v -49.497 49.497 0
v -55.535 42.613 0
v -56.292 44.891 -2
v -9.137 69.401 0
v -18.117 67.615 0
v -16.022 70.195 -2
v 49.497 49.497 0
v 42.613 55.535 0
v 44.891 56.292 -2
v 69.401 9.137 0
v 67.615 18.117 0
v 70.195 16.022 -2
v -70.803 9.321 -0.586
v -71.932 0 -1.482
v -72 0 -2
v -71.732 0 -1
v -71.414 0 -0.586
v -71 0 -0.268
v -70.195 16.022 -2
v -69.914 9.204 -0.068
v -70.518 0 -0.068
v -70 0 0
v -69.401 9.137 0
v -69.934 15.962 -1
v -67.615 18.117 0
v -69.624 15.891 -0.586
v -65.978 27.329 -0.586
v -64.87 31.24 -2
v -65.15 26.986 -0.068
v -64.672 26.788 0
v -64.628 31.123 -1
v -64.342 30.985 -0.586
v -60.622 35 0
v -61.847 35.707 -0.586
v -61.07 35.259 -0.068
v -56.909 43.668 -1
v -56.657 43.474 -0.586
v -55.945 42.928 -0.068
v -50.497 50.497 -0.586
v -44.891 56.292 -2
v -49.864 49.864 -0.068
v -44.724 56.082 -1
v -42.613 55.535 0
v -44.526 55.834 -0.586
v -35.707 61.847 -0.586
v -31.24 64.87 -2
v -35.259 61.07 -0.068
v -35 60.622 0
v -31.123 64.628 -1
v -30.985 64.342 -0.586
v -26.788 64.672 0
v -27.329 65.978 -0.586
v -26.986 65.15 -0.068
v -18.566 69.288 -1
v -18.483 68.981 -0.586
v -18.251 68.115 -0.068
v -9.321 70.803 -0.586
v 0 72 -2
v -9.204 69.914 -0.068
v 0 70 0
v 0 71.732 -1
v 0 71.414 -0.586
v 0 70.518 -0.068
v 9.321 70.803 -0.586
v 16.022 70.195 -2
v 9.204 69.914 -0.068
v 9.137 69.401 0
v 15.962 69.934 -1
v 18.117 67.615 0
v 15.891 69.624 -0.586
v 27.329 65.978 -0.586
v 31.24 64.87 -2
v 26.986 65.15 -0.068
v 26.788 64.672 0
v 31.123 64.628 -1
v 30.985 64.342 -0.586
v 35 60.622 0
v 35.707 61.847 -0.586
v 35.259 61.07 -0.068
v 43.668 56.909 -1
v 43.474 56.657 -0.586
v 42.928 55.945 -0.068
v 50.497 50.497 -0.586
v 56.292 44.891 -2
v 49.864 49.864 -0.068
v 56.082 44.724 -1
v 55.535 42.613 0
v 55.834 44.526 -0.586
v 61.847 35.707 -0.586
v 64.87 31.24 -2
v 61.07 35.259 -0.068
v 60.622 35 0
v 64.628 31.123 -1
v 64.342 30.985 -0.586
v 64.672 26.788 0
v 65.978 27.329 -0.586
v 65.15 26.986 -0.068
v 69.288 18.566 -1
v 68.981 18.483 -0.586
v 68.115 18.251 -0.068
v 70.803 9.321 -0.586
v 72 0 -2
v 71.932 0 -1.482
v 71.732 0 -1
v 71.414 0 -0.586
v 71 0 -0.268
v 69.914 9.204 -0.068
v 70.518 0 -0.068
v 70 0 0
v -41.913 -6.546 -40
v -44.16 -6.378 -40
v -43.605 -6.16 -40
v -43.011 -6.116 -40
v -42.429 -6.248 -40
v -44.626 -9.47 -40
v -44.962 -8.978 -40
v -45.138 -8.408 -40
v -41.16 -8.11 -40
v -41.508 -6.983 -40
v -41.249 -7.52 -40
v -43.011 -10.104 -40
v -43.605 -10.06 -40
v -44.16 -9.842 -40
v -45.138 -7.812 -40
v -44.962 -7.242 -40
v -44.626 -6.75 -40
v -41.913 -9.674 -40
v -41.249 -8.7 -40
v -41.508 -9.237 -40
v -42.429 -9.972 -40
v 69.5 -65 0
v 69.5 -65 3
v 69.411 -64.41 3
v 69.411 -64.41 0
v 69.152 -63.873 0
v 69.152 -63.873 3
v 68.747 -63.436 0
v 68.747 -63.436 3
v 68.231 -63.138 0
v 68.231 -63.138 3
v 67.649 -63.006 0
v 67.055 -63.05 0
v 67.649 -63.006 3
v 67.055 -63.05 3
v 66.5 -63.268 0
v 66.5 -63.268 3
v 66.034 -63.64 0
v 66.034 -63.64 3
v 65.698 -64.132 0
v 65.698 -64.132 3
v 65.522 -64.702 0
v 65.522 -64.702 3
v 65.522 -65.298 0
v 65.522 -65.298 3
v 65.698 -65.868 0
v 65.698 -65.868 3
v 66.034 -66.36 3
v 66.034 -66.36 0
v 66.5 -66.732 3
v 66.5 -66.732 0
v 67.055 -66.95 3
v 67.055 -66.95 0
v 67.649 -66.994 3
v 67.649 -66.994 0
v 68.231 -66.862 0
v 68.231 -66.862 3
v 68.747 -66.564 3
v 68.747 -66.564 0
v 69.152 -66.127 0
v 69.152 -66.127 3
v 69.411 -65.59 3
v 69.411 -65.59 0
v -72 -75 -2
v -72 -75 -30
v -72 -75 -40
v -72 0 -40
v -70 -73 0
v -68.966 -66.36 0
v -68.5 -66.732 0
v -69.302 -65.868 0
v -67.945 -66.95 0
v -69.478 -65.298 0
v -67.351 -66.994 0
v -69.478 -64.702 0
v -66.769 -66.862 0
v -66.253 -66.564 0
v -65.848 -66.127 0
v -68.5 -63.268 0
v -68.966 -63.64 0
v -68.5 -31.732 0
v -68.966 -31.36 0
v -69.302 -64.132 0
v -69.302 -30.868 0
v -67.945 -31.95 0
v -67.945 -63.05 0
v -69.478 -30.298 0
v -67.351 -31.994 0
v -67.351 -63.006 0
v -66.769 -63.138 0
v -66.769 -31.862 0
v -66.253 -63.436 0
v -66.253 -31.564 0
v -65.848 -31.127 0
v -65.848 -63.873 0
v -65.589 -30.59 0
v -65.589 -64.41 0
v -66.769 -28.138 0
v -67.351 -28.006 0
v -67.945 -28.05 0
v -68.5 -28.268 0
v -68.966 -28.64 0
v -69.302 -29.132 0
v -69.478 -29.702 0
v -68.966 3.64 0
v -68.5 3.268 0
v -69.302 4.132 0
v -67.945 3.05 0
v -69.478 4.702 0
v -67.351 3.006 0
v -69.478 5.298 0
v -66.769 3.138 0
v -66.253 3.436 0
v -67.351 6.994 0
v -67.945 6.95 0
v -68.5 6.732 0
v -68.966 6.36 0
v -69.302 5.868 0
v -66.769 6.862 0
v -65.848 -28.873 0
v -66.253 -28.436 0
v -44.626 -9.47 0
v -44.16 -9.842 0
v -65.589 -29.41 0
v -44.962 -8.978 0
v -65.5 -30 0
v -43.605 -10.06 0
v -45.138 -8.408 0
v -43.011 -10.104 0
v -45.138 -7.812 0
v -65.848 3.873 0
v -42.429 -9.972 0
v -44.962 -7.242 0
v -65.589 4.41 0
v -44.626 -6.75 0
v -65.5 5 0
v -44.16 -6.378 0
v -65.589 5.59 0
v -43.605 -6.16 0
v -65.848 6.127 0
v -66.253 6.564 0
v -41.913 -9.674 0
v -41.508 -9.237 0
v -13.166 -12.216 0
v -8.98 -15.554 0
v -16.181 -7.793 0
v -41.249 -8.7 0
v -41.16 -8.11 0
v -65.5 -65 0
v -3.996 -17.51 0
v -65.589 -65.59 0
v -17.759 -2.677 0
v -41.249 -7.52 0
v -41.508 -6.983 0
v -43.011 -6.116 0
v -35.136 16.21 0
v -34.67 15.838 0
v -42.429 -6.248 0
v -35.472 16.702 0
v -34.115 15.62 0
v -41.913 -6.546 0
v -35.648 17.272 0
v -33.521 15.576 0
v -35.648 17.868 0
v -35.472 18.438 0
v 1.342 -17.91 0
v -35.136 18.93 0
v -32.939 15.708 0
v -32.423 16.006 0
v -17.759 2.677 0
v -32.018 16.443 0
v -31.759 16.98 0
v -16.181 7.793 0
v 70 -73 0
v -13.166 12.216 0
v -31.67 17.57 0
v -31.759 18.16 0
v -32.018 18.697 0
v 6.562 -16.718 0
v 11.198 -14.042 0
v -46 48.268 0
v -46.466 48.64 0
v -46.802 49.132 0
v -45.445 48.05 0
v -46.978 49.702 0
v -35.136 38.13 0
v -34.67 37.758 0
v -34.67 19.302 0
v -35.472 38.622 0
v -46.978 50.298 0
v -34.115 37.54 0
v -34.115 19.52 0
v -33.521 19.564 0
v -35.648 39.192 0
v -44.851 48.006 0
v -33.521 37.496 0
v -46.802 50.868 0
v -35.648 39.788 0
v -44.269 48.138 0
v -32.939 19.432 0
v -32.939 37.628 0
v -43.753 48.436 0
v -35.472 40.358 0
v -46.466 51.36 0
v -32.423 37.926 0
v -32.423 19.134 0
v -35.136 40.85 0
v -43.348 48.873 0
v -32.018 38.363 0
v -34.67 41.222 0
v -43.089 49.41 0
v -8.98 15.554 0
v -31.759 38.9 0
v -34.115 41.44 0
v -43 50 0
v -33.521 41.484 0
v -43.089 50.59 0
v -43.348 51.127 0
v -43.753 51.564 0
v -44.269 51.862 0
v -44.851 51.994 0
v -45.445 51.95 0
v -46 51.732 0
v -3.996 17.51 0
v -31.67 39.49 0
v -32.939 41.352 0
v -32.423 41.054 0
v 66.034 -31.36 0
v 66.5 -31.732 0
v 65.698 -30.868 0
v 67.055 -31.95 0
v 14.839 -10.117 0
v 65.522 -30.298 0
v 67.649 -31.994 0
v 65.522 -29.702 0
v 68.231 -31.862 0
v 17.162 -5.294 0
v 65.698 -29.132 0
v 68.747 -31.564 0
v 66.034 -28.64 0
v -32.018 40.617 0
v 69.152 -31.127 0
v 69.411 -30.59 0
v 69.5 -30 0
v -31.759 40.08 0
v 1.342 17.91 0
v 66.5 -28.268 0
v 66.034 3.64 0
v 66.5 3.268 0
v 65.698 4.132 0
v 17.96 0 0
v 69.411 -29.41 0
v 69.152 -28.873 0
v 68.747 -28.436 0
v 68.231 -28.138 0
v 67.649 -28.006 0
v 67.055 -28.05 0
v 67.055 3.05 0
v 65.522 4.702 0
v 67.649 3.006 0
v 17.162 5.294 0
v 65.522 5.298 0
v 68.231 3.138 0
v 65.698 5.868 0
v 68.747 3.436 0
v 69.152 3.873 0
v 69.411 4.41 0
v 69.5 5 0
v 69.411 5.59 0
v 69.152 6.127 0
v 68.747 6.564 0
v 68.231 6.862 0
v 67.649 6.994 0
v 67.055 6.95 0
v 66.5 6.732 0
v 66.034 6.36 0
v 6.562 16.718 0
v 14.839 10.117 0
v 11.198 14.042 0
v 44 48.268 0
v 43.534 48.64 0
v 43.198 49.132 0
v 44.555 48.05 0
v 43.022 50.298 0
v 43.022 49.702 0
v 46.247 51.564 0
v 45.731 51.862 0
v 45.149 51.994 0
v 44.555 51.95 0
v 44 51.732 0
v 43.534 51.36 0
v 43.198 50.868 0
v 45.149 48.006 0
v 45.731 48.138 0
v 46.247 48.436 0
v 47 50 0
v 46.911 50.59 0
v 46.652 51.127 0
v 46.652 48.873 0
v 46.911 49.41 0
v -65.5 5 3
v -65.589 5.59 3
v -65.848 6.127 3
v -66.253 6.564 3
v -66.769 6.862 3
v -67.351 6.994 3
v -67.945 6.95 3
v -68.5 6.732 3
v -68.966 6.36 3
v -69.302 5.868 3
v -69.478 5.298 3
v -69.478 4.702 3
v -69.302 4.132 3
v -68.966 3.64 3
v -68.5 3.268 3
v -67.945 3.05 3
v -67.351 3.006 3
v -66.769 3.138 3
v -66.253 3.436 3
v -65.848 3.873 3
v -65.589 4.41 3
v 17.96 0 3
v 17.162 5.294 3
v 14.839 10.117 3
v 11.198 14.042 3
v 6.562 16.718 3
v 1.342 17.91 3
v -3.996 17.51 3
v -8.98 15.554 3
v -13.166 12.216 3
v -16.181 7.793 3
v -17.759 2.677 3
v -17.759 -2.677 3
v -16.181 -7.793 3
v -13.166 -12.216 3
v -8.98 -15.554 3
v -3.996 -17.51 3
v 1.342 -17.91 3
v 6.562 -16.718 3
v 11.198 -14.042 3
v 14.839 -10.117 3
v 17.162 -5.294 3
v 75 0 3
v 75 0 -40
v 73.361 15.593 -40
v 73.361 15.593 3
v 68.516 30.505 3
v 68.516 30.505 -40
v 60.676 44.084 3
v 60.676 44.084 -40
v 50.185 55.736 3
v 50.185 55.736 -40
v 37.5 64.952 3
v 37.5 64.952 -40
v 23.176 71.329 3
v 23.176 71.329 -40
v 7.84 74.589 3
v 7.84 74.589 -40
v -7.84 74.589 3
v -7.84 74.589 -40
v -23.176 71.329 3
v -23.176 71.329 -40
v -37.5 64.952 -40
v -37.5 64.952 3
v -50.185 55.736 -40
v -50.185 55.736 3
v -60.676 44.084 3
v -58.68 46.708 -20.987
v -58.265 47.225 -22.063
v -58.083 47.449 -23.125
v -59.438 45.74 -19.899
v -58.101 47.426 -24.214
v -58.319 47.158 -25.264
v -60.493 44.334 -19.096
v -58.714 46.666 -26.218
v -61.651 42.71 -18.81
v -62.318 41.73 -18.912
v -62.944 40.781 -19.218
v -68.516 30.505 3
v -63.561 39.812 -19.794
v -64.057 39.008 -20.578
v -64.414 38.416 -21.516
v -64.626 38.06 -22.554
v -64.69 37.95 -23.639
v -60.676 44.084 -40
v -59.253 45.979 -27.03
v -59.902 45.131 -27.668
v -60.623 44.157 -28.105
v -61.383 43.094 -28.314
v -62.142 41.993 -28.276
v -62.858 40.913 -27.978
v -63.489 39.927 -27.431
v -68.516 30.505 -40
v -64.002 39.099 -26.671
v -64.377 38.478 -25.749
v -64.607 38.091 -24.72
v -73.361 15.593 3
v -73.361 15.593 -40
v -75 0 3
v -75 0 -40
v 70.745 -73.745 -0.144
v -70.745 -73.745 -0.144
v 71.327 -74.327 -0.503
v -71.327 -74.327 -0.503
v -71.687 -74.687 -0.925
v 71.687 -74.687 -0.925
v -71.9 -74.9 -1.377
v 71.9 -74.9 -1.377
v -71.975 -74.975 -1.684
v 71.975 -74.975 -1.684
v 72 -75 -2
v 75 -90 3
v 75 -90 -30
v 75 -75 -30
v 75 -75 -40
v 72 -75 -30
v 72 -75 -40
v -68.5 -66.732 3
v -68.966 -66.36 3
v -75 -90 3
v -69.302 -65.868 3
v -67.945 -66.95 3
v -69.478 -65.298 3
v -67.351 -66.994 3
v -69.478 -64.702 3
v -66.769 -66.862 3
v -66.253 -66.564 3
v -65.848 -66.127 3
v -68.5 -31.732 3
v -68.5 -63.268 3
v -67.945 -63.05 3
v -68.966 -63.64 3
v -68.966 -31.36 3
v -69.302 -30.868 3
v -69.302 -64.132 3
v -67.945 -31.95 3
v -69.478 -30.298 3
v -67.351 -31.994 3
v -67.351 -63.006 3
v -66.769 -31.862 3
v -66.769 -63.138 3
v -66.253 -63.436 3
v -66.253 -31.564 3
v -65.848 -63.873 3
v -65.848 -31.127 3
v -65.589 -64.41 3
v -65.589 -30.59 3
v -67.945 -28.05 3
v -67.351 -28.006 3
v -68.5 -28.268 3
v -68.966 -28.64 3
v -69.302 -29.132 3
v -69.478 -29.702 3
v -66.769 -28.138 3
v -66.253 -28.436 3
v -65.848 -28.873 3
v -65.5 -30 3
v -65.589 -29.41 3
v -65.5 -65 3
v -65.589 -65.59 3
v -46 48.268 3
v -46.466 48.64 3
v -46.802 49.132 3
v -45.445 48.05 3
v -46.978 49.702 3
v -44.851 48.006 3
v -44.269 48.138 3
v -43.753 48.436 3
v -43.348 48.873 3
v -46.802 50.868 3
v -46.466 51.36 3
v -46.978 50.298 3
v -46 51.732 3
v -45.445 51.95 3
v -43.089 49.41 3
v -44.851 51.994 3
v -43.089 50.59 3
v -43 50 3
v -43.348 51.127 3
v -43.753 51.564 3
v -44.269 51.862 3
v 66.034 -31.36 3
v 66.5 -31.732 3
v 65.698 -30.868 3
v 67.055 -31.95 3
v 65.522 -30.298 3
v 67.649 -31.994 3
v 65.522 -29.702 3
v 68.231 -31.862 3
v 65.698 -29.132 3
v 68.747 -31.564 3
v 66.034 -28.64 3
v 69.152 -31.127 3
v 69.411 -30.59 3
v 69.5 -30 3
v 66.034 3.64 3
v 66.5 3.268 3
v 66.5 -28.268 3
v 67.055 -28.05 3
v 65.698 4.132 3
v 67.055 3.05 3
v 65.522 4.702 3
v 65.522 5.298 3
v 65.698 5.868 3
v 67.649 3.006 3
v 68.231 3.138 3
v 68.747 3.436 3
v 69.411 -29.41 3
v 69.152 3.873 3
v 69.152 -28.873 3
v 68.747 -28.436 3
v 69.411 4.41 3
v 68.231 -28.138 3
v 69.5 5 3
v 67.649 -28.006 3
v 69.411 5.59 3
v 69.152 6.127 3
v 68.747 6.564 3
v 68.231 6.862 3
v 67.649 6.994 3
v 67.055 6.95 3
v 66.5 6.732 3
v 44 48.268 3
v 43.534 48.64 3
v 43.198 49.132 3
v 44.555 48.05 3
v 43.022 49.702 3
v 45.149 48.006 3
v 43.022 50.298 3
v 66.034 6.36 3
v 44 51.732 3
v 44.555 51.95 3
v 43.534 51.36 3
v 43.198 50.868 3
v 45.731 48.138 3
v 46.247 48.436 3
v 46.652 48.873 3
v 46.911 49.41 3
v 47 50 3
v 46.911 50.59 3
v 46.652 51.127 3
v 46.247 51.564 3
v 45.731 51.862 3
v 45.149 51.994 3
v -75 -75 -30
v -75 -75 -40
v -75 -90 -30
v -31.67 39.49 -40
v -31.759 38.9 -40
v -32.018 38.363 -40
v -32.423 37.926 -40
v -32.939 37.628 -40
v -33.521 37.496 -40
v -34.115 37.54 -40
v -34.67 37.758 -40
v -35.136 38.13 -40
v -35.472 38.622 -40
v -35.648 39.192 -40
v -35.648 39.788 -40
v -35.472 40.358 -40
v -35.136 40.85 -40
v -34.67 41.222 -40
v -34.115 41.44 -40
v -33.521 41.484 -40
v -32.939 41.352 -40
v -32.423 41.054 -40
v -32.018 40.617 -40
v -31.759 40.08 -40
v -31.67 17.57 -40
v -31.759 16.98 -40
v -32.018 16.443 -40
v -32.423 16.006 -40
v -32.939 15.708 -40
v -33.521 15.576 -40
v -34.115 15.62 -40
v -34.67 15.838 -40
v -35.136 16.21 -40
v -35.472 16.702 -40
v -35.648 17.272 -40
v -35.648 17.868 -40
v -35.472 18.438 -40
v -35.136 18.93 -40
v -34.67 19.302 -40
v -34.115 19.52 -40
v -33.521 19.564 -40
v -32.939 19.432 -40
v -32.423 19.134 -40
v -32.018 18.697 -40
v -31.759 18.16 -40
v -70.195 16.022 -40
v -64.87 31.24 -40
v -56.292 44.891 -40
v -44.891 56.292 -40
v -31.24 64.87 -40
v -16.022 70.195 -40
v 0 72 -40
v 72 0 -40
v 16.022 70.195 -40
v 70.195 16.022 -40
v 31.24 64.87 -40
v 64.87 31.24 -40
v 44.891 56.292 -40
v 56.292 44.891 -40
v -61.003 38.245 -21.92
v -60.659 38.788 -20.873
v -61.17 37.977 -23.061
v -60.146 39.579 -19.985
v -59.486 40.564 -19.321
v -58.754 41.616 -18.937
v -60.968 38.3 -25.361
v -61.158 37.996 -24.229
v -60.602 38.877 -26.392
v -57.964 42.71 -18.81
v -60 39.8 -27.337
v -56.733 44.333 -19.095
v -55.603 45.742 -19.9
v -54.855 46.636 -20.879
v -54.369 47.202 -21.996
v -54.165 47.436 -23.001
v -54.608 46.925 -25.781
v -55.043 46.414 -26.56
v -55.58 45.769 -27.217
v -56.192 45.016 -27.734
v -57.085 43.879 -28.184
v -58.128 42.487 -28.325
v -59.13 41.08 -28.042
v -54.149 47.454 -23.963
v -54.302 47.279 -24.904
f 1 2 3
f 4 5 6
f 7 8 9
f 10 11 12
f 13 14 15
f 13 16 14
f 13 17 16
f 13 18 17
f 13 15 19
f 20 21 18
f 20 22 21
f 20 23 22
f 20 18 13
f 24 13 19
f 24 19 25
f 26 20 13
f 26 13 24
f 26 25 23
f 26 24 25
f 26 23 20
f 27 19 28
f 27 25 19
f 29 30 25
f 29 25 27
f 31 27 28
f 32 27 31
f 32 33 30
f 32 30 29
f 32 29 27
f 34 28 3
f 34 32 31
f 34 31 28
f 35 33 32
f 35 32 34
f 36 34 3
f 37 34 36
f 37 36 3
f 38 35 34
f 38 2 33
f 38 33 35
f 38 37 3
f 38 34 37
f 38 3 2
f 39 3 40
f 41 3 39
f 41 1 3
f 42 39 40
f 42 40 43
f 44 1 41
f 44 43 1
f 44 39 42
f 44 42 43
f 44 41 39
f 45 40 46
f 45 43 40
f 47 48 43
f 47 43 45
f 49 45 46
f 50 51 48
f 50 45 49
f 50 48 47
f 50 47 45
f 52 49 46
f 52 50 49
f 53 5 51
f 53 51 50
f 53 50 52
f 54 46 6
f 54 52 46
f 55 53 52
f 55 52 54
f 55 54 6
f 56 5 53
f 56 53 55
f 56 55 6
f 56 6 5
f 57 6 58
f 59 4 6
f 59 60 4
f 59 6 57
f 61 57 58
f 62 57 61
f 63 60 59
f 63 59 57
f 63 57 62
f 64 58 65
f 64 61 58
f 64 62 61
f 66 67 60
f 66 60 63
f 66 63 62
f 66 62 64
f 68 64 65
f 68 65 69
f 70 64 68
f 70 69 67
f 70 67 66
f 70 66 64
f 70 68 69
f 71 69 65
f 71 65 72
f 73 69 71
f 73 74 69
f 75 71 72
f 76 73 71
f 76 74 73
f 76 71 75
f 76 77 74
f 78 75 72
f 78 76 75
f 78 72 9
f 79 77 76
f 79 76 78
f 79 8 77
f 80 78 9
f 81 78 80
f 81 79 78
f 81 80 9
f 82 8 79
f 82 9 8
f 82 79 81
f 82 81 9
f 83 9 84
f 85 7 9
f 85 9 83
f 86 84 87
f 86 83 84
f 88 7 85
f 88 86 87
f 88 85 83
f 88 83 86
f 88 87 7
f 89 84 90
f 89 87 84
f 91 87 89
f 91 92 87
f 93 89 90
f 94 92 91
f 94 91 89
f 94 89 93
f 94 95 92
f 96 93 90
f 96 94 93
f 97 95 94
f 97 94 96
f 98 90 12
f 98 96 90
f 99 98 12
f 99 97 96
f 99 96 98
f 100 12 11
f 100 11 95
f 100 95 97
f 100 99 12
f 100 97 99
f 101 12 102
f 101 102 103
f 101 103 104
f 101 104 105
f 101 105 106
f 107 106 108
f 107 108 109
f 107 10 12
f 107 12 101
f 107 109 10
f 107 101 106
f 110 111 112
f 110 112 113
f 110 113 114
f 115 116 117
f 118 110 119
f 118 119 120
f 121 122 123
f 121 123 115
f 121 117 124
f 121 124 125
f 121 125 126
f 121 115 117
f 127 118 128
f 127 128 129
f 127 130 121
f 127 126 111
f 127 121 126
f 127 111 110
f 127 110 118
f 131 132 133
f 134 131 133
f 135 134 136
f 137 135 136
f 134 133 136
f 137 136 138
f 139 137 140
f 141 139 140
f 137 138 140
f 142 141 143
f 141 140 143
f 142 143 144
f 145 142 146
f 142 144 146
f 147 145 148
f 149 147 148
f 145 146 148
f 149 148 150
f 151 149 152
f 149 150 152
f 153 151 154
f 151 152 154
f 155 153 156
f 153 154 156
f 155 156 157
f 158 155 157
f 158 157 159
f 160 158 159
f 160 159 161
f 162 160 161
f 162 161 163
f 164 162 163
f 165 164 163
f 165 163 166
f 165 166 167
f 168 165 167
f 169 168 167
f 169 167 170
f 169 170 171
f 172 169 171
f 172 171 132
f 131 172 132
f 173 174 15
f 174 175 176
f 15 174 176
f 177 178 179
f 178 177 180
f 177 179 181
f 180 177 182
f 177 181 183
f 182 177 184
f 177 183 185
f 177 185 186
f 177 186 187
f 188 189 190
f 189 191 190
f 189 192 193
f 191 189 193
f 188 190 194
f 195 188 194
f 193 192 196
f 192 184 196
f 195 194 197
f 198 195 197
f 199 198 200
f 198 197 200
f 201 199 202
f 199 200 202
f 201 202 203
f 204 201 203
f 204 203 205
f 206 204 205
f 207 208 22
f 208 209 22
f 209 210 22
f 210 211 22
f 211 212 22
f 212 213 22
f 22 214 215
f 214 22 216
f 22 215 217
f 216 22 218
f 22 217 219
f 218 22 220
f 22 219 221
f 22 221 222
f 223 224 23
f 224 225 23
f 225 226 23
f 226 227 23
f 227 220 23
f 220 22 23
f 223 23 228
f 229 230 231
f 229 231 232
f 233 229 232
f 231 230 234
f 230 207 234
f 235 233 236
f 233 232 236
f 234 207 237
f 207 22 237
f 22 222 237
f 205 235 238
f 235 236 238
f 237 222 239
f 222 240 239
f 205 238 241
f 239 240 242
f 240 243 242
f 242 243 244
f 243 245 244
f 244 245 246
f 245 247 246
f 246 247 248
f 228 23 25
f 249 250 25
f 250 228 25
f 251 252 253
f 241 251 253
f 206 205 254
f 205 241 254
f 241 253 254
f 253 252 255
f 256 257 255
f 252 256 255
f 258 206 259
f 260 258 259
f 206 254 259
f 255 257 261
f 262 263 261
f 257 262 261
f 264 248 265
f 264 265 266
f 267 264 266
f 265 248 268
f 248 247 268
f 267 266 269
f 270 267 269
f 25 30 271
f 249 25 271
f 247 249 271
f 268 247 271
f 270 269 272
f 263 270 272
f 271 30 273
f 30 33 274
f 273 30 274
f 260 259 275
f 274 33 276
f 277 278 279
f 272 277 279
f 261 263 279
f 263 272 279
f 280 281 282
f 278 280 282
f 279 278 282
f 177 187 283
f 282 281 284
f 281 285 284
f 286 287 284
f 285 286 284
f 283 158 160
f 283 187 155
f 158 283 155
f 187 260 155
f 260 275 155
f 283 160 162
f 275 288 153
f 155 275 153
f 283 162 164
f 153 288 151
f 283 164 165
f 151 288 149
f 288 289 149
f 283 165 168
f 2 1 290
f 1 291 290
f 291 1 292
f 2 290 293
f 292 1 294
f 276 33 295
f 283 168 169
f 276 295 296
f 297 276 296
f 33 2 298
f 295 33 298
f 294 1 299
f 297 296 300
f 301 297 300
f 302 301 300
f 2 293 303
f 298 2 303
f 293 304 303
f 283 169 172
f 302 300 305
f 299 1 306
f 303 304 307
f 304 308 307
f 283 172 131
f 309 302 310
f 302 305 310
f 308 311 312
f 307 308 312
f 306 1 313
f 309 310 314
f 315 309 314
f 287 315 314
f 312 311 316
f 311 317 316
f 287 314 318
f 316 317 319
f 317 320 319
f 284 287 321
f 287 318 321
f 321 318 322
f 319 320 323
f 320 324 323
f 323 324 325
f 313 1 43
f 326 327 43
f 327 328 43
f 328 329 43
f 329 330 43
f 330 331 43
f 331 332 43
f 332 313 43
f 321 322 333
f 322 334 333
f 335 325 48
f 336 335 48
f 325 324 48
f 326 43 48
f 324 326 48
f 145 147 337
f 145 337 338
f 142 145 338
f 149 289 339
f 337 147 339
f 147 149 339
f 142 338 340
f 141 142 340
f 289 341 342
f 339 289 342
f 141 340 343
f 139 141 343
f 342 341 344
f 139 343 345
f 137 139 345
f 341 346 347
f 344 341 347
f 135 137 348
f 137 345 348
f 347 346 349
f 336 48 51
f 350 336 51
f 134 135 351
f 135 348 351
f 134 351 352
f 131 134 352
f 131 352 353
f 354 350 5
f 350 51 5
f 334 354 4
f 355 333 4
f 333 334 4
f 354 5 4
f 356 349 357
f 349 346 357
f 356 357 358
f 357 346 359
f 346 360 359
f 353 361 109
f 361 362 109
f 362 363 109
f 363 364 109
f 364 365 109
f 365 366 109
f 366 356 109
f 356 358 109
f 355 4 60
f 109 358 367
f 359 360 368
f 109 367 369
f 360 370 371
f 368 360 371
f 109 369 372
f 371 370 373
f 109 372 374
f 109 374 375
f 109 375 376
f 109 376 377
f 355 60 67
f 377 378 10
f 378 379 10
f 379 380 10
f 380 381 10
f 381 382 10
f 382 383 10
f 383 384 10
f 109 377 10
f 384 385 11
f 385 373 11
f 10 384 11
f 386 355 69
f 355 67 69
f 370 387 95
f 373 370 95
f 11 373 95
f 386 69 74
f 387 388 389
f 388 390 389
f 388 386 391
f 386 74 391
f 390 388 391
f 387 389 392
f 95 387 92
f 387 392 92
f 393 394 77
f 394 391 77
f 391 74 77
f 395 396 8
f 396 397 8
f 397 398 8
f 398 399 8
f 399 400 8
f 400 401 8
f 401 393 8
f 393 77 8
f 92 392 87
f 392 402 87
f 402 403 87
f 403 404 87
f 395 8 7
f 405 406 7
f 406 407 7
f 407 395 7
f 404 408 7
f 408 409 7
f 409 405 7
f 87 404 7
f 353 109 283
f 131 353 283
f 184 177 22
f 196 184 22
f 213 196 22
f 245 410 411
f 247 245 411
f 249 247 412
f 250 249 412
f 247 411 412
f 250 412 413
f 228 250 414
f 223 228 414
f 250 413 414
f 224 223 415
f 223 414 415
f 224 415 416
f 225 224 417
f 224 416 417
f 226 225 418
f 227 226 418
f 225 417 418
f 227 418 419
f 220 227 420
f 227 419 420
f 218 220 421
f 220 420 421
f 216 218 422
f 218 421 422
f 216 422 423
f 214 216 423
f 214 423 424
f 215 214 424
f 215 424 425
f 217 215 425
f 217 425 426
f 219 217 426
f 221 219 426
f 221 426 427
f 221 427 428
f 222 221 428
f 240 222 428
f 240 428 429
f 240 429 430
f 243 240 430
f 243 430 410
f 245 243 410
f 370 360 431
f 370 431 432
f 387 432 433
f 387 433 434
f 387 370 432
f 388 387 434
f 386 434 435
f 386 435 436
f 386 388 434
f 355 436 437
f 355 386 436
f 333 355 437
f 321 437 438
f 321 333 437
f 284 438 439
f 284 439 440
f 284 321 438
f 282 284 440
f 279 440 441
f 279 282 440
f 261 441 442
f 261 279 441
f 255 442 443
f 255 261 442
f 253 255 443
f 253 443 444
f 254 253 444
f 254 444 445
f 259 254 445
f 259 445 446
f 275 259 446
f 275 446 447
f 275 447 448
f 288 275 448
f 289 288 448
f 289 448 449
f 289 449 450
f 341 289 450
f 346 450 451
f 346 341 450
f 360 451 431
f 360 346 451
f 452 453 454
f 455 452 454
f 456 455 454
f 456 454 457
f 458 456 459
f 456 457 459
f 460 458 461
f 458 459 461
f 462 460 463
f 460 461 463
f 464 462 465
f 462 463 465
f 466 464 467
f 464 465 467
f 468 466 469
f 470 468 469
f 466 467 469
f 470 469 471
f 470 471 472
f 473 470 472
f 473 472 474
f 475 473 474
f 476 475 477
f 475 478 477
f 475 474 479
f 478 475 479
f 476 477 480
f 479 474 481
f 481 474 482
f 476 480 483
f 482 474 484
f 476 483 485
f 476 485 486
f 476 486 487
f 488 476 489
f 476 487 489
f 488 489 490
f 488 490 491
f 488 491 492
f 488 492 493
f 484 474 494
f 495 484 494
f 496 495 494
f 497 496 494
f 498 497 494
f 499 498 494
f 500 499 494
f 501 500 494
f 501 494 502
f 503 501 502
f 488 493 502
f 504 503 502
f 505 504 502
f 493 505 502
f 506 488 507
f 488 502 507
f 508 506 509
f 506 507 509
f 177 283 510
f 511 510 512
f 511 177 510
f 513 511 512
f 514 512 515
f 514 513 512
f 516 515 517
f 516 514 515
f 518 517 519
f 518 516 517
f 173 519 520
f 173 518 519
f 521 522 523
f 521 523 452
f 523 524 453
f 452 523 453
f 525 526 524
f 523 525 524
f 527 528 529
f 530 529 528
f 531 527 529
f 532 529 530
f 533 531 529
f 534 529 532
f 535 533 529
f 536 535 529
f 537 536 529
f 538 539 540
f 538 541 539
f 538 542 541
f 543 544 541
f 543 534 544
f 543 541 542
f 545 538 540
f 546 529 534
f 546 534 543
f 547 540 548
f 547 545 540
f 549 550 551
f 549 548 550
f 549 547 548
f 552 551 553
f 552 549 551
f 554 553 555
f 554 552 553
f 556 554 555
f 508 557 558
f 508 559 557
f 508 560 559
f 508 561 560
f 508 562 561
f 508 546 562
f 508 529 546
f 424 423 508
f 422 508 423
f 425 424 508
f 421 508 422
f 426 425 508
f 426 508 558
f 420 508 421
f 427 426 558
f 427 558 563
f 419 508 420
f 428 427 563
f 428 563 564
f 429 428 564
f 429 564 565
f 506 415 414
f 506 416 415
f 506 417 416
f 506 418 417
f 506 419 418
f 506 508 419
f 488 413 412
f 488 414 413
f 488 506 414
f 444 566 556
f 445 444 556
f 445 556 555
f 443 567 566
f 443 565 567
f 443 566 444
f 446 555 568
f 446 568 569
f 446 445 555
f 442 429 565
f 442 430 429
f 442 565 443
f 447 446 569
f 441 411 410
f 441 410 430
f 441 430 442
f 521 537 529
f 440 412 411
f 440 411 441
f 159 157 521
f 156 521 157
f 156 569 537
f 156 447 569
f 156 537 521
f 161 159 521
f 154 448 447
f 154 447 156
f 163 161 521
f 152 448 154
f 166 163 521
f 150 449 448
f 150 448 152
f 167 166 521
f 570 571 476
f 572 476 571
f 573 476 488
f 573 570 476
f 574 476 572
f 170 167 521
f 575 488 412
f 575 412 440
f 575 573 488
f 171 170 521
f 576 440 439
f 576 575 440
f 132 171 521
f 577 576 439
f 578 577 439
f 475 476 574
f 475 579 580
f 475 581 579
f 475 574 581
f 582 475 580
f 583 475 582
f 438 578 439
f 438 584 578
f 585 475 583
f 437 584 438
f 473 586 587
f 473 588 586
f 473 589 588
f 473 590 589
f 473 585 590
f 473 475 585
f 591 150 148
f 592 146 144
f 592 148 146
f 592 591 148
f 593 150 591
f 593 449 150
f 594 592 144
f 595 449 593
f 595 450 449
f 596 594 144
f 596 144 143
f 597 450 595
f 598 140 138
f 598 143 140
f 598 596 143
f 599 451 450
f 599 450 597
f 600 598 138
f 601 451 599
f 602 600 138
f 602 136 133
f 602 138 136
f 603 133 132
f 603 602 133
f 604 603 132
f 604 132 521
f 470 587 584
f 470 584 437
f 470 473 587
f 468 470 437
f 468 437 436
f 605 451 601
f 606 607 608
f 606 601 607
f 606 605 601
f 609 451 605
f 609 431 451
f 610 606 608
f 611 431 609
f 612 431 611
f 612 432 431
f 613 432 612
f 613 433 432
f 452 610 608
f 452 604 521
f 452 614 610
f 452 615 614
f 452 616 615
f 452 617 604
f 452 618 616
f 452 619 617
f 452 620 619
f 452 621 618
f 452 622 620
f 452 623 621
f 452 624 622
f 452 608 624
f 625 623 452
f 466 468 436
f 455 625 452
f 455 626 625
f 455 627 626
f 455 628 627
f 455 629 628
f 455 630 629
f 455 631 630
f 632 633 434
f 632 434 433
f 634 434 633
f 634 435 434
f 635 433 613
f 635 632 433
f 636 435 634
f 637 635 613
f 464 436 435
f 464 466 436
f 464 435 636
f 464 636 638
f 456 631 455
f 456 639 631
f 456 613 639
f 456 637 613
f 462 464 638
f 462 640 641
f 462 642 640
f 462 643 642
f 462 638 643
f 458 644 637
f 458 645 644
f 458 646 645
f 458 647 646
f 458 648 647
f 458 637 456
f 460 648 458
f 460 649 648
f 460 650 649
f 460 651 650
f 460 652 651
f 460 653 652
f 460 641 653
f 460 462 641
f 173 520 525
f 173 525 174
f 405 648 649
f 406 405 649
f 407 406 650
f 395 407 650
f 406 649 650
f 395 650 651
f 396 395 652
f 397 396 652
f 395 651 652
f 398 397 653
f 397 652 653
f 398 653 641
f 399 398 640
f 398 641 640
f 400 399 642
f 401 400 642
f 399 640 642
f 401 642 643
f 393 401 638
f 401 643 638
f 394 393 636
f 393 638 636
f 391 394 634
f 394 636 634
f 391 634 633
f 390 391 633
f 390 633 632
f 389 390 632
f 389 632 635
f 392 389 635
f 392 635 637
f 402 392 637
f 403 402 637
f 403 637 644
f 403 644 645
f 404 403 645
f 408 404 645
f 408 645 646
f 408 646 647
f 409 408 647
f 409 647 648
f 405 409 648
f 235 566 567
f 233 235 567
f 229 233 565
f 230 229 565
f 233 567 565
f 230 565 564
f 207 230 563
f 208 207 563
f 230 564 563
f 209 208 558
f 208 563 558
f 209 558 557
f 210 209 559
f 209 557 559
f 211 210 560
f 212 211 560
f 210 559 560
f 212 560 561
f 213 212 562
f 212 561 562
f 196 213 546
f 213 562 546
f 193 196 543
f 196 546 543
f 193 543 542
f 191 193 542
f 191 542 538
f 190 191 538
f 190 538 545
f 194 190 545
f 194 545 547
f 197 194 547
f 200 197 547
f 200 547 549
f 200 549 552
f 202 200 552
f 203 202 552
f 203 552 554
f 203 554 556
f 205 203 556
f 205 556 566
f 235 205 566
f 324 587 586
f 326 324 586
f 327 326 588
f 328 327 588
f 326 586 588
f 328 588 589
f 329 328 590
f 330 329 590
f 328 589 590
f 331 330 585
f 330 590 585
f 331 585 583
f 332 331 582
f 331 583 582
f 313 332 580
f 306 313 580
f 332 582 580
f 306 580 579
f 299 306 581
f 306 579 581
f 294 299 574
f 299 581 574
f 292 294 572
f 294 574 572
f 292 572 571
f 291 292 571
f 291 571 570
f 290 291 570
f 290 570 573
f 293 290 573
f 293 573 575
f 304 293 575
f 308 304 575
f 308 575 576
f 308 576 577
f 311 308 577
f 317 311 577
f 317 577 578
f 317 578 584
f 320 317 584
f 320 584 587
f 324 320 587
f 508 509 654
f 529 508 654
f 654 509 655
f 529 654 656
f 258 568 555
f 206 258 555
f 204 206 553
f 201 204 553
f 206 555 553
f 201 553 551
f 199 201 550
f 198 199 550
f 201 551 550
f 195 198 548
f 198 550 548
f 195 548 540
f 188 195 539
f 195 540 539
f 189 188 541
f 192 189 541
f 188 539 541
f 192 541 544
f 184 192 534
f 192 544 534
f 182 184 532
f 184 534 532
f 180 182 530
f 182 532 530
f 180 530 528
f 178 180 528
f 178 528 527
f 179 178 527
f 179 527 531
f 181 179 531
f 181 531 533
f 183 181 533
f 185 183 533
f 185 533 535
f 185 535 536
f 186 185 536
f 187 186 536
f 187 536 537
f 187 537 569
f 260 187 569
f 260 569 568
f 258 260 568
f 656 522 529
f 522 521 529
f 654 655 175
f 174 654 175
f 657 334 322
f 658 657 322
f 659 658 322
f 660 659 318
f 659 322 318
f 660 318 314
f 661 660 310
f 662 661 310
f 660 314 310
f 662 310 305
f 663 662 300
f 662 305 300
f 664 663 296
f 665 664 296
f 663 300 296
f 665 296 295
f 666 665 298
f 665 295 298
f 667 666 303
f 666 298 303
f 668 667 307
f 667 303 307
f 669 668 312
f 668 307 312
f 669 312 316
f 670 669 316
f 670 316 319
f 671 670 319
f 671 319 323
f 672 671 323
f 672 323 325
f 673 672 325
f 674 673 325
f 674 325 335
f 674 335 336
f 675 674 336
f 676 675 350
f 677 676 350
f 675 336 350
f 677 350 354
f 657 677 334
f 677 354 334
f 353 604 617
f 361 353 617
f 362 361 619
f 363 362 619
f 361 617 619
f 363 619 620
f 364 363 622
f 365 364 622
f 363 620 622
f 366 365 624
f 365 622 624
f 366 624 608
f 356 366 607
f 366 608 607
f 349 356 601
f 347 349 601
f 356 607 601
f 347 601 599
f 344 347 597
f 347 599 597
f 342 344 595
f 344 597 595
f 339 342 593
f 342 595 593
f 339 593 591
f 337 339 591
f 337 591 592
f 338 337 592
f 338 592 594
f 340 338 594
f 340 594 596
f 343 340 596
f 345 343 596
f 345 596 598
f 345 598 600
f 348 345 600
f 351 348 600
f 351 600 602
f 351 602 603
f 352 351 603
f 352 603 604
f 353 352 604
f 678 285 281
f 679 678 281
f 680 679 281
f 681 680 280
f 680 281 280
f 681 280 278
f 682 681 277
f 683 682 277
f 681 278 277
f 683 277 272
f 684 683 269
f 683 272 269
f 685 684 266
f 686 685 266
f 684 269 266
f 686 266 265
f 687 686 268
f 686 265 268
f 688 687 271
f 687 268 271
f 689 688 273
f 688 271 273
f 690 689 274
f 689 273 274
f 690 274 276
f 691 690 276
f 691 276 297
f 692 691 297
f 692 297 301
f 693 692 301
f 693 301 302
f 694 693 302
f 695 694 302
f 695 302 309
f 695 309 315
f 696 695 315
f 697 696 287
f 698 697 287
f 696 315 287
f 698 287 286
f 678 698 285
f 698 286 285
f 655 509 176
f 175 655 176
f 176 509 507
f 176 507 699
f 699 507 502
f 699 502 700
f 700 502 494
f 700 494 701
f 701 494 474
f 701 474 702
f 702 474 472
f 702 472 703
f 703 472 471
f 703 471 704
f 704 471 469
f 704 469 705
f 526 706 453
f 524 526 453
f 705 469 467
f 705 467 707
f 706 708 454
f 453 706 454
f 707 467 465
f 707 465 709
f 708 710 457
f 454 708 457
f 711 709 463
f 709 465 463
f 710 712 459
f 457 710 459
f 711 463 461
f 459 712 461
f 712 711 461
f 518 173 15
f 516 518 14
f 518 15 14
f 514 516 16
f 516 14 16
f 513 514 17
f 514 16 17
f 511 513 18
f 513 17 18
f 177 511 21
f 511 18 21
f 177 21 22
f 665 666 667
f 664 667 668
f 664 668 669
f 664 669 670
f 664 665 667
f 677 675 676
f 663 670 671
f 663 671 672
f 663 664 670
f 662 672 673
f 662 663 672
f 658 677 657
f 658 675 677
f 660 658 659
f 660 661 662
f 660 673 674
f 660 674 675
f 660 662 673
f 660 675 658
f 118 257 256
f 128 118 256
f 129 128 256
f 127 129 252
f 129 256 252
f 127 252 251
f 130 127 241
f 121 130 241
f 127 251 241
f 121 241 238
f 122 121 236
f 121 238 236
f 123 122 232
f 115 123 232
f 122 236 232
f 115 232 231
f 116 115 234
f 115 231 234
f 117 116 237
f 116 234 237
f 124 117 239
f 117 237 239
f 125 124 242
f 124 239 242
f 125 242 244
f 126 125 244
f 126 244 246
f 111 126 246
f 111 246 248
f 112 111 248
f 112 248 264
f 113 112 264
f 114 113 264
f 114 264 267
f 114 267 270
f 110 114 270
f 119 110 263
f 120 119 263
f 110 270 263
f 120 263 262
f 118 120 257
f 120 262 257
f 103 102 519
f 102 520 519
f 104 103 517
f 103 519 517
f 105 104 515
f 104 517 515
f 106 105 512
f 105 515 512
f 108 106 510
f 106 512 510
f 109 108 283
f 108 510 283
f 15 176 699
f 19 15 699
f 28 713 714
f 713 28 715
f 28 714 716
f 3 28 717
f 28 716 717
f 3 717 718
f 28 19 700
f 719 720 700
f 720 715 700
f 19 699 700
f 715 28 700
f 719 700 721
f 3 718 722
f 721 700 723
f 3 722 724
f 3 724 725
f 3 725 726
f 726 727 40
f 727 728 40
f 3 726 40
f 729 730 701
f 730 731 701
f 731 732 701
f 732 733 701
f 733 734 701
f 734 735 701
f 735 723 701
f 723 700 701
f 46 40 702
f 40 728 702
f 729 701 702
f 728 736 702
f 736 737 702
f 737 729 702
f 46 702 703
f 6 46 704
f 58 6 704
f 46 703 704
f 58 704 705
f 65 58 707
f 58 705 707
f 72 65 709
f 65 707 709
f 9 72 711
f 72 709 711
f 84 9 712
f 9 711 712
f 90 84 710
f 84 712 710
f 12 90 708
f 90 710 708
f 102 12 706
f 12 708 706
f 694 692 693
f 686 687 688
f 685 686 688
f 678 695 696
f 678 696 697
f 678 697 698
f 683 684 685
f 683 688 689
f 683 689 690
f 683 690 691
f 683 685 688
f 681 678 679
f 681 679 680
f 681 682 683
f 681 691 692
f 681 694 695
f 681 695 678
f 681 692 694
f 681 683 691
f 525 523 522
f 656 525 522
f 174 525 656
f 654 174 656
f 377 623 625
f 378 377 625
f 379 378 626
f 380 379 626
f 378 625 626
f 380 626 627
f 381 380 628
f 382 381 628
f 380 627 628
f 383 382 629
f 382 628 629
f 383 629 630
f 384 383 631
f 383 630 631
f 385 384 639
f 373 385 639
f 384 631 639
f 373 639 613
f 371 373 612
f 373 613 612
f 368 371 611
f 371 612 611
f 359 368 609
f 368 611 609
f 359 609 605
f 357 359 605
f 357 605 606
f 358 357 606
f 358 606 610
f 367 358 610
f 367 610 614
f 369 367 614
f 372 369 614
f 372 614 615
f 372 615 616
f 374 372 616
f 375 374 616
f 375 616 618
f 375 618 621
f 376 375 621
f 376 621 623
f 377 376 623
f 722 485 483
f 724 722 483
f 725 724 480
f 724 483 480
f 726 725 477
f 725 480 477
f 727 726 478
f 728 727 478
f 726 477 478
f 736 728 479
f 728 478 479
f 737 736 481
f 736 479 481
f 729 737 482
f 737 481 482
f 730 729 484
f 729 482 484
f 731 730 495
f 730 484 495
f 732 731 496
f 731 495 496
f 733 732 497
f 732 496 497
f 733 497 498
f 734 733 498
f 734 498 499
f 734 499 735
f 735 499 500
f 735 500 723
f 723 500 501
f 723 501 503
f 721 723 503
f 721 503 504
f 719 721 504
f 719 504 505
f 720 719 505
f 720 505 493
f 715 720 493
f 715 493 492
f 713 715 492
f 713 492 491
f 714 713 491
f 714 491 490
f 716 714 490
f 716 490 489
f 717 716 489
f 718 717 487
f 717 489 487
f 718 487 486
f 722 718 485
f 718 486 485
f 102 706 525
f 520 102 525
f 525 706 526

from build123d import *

# Parameters (mm, degrees)
SKETCH1_R           = 17.96
BOSS_EXTRUDE1_DEPTH = 3
SKETCH2_W           = 150
SKETCH2_H           = 15
BOSS_EXTRUDE2_DEPTH = 30
BOSS_EXTRUDE3_START = 40
BOSS_EXTRUDE3_DEPTH = 40
FILLET1_R           = 2
SKETCH4_R           = 2
CUT_EXTRUDE1_DEPTH  = 4
SKETCH6_R           = 2
BOSS_EXTRUDE4_DEPTH = 40
SKETCH7_R           = 4.76
CUT_EXTRUDE4_DEPTH  = 30
SKETCH5_R           = 2
CUT_EXTRUDE6_DEPTH  = 60


with BuildPart() as part:
    # Sketch1 → Boss-Extrude1 (new body)
    with BuildSketch(Plane.XY):
        with BuildLine():
            Line((-75, 0), (-75, -75))
            Line((-75, -75), (-75, -90))
            Line((-75, -90), (75, -90))
            Line((75, -90), (75, -75))
            Line((75, -75), (75, 0))
            ThreePointArc((75, 0), (0, 75), (-75, 0))
        make_face()
        Circle(SKETCH1_R, mode=Mode.SUBTRACT)
    extrude(amount=BOSS_EXTRUDE1_DEPTH)

    # Sketch2 → Boss-Extrude2 (add)
    with BuildSketch(Plane(origin=(0, 0, 0), x_dir=(-1, 0, 0), z_dir=(0, 0, -1))):
        with Locations((0, -82.5)):
            Rectangle(SKETCH2_W, SKETCH2_H)
    extrude(amount=BOSS_EXTRUDE2_DEPTH)

    # Sketch3 → Boss-Extrude3 (add)
    with BuildSketch(Plane(origin=(0, 0, 0), x_dir=(-1, 0, 0), z_dir=(0, 0, -1)).offset(BOSS_EXTRUDE3_START)):
        with BuildLine():
            Line((75, 0), (75, -75))
            Line((75, -75), (72, -75))
            Line((72, -75), (72, 0))
            ThreePointArc((72, 0), (0, 72), (-72, 0))
            Line((-72, 0), (-72, -75))
            Line((-72, -75), (-75, -75))
            Line((-75, -75), (-75, 0))
            ThreePointArc((-75, 0), (0, 75), (75, 0))
        make_face()
    extrude(amount=-BOSS_EXTRUDE3_DEPTH)

    # Fillet1
    fillet1_edges = [part.edges().sort_by_distance(p)[0] for p in [
        (0, -75, 0),
        (72, -37.5, 0),
        (0, 72, 0),
        (-72, -37.5, 0),
    ]]
    fillet(fillet1_edges, radius=FILLET1_R)

    # Sketch4 → Cut-Extrude1 (cut)
    with BuildSketch(Plane.XY.offset(3)):
        with Locations((-67.5, -65)):
            Circle(SKETCH4_R)
        with Locations((67.5, -65)):
            Circle(SKETCH4_R)
        with Locations((67.5, -30)):
            Circle(SKETCH4_R)
        with Locations((67.5, 5)):
            Circle(SKETCH4_R)
        with Locations((-67.5, -30)):
            Circle(SKETCH4_R)
        with Locations((-67.5, 5)):
            Circle(SKETCH4_R)
    extrude(amount=-CUT_EXTRUDE1_DEPTH, mode=Mode.SUBTRACT)

    # Sketch6 → Boss-Extrude4 (add)
    with BuildSketch(Plane(origin=(0, 0, 0), x_dir=(-1, 0, 0), z_dir=(0, 0, -1))):
        with Locations(Location((43.16, -8.11, 0), (0, 0, 180))):
            Circle(SKETCH6_R)
        with Locations(Location((33.67, 17.57, 0), (0, 0, 180))):
            Circle(SKETCH6_R)
        with Locations(Location((33.67, 39.49, 0), (0, 0, 180))):
            Circle(SKETCH6_R)
    extrude(amount=BOSS_EXTRUDE4_DEPTH)

    # Sketch7 → Cut-Extrude4 (cut)
    with BuildSketch(Plane.ZY.offset(75)):
        with Locations((-23.57, 42.71)):
            Circle(SKETCH7_R)
    extrude(amount=-CUT_EXTRUDE4_DEPTH, mode=Mode.SUBTRACT)

    # Sketch5 → Cut-Extrude6 (cut)
    with BuildSketch(Plane.XY.offset(3)):
        with Locations((-45, 50)):
            Circle(SKETCH5_R)
        with Locations((45, 50)):
            Circle(SKETCH5_R)
    extrude(amount=-CUT_EXTRUDE6_DEPTH, mode=Mode.SUBTRACT)


solid = part.part
